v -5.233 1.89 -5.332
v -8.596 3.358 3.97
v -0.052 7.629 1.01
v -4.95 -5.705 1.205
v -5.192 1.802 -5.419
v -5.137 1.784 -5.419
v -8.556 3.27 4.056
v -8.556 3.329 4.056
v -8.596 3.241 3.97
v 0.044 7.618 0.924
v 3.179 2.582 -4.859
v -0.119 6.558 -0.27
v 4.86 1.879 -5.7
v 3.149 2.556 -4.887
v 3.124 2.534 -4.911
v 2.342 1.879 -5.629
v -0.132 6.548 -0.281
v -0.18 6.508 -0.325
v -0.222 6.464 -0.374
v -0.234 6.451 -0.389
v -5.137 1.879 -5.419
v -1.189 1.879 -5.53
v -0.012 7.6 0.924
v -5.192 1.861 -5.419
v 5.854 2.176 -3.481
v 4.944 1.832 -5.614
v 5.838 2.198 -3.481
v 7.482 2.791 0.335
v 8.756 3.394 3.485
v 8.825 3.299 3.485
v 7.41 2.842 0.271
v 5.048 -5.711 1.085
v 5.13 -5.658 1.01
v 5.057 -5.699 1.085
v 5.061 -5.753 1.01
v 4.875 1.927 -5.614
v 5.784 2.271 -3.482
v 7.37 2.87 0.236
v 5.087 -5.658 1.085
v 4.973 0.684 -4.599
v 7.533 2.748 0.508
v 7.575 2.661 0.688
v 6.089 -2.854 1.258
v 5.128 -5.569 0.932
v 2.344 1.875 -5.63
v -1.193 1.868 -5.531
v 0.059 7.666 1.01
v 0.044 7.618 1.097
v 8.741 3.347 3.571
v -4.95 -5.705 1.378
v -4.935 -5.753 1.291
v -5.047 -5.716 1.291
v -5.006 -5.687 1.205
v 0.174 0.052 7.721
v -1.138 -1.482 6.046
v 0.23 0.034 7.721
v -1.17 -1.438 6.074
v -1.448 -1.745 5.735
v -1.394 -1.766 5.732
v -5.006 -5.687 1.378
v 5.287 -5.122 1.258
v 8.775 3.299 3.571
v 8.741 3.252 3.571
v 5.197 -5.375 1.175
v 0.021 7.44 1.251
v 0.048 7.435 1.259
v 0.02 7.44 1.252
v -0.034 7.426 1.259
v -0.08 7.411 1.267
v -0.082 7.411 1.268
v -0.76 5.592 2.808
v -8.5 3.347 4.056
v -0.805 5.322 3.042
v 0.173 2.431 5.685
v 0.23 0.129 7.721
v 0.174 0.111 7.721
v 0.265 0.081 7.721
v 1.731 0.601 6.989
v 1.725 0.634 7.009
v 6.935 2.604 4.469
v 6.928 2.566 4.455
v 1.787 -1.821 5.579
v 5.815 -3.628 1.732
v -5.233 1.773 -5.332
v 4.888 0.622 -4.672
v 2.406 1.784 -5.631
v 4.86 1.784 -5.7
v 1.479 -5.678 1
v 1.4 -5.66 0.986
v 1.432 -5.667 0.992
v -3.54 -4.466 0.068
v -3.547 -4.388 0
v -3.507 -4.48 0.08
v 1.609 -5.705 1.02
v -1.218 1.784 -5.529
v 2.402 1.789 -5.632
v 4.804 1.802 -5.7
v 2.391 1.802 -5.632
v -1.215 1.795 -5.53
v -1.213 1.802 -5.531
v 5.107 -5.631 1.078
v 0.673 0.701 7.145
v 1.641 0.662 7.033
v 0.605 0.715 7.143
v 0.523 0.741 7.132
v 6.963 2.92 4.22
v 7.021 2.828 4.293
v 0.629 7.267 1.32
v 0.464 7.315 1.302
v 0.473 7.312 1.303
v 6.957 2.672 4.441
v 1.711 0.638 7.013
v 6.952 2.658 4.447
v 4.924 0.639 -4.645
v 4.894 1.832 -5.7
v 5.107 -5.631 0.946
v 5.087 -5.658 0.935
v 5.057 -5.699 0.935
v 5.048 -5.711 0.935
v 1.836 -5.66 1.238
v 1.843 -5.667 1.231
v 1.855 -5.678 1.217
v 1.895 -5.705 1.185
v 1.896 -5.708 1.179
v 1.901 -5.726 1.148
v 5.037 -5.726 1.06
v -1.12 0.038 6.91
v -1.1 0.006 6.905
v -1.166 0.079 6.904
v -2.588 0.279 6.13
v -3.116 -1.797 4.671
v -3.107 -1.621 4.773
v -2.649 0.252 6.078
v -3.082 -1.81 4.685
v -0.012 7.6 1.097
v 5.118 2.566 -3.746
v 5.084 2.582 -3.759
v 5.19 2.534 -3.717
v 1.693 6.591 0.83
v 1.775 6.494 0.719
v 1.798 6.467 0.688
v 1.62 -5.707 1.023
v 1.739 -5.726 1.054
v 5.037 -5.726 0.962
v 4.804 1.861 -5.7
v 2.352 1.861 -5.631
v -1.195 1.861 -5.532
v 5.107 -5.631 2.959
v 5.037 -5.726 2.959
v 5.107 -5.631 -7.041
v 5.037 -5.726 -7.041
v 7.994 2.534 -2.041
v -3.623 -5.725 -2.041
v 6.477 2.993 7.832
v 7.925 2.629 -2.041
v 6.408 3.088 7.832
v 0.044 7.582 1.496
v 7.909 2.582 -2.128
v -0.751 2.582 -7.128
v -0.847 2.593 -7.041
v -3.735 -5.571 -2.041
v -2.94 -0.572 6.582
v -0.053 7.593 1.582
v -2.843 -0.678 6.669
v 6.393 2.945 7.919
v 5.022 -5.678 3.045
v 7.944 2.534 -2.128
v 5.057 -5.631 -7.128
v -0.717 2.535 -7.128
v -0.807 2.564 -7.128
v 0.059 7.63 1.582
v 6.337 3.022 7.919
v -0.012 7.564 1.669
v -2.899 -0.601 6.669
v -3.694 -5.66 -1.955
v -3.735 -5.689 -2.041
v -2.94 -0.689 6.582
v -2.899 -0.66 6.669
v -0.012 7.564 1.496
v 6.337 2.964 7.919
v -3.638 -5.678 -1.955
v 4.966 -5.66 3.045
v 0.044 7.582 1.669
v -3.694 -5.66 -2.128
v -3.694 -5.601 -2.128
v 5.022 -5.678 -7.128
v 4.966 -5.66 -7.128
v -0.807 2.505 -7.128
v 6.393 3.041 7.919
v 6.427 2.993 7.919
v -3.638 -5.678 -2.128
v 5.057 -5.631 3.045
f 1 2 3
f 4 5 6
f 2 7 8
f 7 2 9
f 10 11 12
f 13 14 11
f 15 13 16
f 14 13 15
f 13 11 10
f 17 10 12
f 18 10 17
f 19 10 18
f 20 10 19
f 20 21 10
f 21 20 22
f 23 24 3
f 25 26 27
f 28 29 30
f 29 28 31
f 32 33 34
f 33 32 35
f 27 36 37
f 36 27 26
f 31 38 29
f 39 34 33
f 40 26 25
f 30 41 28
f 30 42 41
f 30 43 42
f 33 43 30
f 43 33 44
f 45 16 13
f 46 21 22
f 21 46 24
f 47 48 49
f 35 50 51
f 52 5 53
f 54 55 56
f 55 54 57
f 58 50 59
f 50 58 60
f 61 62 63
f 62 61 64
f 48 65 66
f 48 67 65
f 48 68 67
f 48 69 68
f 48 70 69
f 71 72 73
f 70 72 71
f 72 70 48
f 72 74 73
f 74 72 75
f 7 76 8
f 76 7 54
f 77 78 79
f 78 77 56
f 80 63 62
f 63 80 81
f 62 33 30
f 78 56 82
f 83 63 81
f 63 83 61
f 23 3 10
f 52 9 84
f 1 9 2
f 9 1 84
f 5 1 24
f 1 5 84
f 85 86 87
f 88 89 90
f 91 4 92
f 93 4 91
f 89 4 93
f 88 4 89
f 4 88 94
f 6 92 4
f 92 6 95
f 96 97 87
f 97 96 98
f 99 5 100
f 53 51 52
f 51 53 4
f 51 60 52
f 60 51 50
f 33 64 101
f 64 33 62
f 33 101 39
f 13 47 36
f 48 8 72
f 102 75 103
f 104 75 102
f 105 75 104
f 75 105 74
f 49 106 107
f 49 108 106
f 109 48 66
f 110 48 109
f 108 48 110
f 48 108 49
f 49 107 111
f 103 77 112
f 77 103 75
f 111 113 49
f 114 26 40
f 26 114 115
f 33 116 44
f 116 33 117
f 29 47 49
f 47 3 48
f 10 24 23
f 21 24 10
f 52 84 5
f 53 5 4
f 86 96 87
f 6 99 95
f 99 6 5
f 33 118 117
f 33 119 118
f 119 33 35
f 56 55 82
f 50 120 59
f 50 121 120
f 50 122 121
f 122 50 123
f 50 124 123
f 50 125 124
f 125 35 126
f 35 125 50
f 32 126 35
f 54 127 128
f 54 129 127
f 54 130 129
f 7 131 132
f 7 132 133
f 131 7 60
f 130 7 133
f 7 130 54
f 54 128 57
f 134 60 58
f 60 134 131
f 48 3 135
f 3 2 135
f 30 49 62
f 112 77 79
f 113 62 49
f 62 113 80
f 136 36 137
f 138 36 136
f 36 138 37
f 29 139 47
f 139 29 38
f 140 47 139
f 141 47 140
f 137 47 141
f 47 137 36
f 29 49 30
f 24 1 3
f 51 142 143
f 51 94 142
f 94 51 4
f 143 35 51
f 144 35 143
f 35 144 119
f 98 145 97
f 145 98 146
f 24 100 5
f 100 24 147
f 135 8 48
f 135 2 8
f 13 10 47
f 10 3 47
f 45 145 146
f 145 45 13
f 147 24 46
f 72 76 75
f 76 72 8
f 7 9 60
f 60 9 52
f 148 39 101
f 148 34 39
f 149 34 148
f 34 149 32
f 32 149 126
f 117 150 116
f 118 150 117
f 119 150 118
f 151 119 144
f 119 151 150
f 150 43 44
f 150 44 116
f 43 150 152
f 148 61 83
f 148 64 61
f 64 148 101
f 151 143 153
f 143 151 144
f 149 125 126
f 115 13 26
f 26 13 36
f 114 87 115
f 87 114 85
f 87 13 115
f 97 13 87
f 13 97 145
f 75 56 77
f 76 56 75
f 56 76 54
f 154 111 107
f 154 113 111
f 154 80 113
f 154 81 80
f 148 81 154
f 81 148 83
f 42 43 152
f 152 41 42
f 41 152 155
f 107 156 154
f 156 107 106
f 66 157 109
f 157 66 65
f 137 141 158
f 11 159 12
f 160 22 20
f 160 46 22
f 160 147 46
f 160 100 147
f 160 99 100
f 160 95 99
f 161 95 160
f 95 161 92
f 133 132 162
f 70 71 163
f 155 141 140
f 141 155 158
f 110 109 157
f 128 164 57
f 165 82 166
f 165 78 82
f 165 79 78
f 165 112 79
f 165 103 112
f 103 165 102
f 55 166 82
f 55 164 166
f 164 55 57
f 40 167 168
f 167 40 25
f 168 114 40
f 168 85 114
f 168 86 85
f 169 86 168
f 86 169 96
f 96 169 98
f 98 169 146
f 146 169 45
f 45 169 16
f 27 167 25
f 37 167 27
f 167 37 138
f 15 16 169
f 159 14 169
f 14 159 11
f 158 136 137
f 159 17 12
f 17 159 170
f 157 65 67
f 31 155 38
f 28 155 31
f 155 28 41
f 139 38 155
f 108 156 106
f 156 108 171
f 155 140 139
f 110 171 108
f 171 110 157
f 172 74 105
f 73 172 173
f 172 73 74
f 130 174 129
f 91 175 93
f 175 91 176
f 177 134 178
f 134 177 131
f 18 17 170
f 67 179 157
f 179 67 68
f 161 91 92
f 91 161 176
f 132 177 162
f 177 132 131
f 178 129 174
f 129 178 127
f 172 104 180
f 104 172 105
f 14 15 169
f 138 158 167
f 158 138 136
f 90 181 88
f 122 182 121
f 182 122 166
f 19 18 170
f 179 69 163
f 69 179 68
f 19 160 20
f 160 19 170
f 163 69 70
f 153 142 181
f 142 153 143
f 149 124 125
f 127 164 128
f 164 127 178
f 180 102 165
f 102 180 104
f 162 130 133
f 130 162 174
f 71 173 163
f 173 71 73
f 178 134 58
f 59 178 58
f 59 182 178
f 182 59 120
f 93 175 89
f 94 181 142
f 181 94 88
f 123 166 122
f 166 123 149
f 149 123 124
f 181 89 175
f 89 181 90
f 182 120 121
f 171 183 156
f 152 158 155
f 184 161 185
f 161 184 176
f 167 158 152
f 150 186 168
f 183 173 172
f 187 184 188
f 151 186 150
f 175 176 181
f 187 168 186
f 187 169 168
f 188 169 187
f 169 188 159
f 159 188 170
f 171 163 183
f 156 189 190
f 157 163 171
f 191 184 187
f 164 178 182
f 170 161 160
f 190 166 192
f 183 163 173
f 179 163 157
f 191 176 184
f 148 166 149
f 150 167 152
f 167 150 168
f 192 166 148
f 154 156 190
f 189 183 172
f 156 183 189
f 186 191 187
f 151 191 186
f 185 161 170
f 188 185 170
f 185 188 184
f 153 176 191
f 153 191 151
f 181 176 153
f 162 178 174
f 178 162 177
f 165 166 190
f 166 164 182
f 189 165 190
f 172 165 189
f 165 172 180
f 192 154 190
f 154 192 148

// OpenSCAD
// Auto-generated OpenSCAD file

    inner_points = 10*[[-0.36537328936366986, -0.5630248957199848, -0.2041241481408165], [-0.07665632407859727, 0.2534568958636895, -0.7041241461097079], [-0.28588836871909684, -0.06302896737091813, 0.6582482882371564], [0.0028285965659757967, 0.7534528242127562, 0.15824829026826498], [0.5006521103988715, -0.5630692614318152, 0.29587585685699724], [0.7893690756839442, 0.25341253015185916, -0.20412414111189417], [0.5006521161698728, -0.5630692609848701, -0.7041241431430026], [0.6377433254045676, 0.299296152151859, 0.7832482937293753]];

    outer_points = 10*[[0.5030398526543044, -0.5657546721443936, 0.10102420958195456], [0.4844053090391255, 0.18317157791304, -0.5613670839592305], [-0.49656467091517004, -0.5657546721443936, 0.12914531303547902], [-0.515199214530349, 0.18317157791304, -0.533245980505706], [0.021476633683634054, 0.008119969202636801, 0.763417417694344], [0.002842090068455094, 0.7570462192600704, 0.10102612415315894], [0.872517286240693, 0.3299291148283261, 0.34848527687259606], [-0.8515454892055908, 0.3299291148283261, 0.39698700583193464]];

    // Convex hull for inner set (I)
    module inner_hull() {
        hull() {
            for (p = inner_points) {
                translate(p) sphere(r=0.1);
            }
        }
    }

    // Convex hull for outer set (O) minus inner hull (O \ I)
    module outer_minus_inner() {
        difference() {
            hull() {
                for (p = outer_points) {
                    translate(p) sphere(r=0.1);
                }
            }
            inner_hull(); // Subtract inner hull
        }
    }

    // Convex hull for outer set (O) minus all translated inner hulls
    module outer_minus_AllTranslationInner() {
        difference() {
            hull() {
                for (p = outer_points) {
                    translate(p) sphere(r=0.1);
                }
            }
            hull() {
                translate([0,0,50]) inner_hull();
                translate([0,0,-50]) inner_hull();
            }; // Subtract translated inner hulls
        }
    }

    // Difference between outer_minus_inner and outer_minus_AllTranslationInner
    module outer_minus_inner_diff() {
        difference() {
            // Outer minus inner
            difference() {
                hull() {
                    for (p = outer_points) {
                        translate(p) sphere(r=0.1);
                    }
                }
                inner_hull();
            }

            // Subtract Outer minus AllTranslationInner
            difference() {
                hull() {
                    for (p = outer_points) {
                        translate(p) sphere(r=0.1);
                    }
                }
                hull() {
                    translate([0,0,50]) inner_hull();
                    translate([0,0,-50]) inner_hull();
                };
            }
        }
    }

    // Rendering all with colors applied
    color([1, 0, 0, 0.5]) inner_hull(); // Transparent red
    color([0, 1, 0, 1]) outer_minus_AllTranslationInner(); // Opaque green
    color([1, 1, 0, 1]) outer_minus_inner_diff(); // Opaque yellow
    
